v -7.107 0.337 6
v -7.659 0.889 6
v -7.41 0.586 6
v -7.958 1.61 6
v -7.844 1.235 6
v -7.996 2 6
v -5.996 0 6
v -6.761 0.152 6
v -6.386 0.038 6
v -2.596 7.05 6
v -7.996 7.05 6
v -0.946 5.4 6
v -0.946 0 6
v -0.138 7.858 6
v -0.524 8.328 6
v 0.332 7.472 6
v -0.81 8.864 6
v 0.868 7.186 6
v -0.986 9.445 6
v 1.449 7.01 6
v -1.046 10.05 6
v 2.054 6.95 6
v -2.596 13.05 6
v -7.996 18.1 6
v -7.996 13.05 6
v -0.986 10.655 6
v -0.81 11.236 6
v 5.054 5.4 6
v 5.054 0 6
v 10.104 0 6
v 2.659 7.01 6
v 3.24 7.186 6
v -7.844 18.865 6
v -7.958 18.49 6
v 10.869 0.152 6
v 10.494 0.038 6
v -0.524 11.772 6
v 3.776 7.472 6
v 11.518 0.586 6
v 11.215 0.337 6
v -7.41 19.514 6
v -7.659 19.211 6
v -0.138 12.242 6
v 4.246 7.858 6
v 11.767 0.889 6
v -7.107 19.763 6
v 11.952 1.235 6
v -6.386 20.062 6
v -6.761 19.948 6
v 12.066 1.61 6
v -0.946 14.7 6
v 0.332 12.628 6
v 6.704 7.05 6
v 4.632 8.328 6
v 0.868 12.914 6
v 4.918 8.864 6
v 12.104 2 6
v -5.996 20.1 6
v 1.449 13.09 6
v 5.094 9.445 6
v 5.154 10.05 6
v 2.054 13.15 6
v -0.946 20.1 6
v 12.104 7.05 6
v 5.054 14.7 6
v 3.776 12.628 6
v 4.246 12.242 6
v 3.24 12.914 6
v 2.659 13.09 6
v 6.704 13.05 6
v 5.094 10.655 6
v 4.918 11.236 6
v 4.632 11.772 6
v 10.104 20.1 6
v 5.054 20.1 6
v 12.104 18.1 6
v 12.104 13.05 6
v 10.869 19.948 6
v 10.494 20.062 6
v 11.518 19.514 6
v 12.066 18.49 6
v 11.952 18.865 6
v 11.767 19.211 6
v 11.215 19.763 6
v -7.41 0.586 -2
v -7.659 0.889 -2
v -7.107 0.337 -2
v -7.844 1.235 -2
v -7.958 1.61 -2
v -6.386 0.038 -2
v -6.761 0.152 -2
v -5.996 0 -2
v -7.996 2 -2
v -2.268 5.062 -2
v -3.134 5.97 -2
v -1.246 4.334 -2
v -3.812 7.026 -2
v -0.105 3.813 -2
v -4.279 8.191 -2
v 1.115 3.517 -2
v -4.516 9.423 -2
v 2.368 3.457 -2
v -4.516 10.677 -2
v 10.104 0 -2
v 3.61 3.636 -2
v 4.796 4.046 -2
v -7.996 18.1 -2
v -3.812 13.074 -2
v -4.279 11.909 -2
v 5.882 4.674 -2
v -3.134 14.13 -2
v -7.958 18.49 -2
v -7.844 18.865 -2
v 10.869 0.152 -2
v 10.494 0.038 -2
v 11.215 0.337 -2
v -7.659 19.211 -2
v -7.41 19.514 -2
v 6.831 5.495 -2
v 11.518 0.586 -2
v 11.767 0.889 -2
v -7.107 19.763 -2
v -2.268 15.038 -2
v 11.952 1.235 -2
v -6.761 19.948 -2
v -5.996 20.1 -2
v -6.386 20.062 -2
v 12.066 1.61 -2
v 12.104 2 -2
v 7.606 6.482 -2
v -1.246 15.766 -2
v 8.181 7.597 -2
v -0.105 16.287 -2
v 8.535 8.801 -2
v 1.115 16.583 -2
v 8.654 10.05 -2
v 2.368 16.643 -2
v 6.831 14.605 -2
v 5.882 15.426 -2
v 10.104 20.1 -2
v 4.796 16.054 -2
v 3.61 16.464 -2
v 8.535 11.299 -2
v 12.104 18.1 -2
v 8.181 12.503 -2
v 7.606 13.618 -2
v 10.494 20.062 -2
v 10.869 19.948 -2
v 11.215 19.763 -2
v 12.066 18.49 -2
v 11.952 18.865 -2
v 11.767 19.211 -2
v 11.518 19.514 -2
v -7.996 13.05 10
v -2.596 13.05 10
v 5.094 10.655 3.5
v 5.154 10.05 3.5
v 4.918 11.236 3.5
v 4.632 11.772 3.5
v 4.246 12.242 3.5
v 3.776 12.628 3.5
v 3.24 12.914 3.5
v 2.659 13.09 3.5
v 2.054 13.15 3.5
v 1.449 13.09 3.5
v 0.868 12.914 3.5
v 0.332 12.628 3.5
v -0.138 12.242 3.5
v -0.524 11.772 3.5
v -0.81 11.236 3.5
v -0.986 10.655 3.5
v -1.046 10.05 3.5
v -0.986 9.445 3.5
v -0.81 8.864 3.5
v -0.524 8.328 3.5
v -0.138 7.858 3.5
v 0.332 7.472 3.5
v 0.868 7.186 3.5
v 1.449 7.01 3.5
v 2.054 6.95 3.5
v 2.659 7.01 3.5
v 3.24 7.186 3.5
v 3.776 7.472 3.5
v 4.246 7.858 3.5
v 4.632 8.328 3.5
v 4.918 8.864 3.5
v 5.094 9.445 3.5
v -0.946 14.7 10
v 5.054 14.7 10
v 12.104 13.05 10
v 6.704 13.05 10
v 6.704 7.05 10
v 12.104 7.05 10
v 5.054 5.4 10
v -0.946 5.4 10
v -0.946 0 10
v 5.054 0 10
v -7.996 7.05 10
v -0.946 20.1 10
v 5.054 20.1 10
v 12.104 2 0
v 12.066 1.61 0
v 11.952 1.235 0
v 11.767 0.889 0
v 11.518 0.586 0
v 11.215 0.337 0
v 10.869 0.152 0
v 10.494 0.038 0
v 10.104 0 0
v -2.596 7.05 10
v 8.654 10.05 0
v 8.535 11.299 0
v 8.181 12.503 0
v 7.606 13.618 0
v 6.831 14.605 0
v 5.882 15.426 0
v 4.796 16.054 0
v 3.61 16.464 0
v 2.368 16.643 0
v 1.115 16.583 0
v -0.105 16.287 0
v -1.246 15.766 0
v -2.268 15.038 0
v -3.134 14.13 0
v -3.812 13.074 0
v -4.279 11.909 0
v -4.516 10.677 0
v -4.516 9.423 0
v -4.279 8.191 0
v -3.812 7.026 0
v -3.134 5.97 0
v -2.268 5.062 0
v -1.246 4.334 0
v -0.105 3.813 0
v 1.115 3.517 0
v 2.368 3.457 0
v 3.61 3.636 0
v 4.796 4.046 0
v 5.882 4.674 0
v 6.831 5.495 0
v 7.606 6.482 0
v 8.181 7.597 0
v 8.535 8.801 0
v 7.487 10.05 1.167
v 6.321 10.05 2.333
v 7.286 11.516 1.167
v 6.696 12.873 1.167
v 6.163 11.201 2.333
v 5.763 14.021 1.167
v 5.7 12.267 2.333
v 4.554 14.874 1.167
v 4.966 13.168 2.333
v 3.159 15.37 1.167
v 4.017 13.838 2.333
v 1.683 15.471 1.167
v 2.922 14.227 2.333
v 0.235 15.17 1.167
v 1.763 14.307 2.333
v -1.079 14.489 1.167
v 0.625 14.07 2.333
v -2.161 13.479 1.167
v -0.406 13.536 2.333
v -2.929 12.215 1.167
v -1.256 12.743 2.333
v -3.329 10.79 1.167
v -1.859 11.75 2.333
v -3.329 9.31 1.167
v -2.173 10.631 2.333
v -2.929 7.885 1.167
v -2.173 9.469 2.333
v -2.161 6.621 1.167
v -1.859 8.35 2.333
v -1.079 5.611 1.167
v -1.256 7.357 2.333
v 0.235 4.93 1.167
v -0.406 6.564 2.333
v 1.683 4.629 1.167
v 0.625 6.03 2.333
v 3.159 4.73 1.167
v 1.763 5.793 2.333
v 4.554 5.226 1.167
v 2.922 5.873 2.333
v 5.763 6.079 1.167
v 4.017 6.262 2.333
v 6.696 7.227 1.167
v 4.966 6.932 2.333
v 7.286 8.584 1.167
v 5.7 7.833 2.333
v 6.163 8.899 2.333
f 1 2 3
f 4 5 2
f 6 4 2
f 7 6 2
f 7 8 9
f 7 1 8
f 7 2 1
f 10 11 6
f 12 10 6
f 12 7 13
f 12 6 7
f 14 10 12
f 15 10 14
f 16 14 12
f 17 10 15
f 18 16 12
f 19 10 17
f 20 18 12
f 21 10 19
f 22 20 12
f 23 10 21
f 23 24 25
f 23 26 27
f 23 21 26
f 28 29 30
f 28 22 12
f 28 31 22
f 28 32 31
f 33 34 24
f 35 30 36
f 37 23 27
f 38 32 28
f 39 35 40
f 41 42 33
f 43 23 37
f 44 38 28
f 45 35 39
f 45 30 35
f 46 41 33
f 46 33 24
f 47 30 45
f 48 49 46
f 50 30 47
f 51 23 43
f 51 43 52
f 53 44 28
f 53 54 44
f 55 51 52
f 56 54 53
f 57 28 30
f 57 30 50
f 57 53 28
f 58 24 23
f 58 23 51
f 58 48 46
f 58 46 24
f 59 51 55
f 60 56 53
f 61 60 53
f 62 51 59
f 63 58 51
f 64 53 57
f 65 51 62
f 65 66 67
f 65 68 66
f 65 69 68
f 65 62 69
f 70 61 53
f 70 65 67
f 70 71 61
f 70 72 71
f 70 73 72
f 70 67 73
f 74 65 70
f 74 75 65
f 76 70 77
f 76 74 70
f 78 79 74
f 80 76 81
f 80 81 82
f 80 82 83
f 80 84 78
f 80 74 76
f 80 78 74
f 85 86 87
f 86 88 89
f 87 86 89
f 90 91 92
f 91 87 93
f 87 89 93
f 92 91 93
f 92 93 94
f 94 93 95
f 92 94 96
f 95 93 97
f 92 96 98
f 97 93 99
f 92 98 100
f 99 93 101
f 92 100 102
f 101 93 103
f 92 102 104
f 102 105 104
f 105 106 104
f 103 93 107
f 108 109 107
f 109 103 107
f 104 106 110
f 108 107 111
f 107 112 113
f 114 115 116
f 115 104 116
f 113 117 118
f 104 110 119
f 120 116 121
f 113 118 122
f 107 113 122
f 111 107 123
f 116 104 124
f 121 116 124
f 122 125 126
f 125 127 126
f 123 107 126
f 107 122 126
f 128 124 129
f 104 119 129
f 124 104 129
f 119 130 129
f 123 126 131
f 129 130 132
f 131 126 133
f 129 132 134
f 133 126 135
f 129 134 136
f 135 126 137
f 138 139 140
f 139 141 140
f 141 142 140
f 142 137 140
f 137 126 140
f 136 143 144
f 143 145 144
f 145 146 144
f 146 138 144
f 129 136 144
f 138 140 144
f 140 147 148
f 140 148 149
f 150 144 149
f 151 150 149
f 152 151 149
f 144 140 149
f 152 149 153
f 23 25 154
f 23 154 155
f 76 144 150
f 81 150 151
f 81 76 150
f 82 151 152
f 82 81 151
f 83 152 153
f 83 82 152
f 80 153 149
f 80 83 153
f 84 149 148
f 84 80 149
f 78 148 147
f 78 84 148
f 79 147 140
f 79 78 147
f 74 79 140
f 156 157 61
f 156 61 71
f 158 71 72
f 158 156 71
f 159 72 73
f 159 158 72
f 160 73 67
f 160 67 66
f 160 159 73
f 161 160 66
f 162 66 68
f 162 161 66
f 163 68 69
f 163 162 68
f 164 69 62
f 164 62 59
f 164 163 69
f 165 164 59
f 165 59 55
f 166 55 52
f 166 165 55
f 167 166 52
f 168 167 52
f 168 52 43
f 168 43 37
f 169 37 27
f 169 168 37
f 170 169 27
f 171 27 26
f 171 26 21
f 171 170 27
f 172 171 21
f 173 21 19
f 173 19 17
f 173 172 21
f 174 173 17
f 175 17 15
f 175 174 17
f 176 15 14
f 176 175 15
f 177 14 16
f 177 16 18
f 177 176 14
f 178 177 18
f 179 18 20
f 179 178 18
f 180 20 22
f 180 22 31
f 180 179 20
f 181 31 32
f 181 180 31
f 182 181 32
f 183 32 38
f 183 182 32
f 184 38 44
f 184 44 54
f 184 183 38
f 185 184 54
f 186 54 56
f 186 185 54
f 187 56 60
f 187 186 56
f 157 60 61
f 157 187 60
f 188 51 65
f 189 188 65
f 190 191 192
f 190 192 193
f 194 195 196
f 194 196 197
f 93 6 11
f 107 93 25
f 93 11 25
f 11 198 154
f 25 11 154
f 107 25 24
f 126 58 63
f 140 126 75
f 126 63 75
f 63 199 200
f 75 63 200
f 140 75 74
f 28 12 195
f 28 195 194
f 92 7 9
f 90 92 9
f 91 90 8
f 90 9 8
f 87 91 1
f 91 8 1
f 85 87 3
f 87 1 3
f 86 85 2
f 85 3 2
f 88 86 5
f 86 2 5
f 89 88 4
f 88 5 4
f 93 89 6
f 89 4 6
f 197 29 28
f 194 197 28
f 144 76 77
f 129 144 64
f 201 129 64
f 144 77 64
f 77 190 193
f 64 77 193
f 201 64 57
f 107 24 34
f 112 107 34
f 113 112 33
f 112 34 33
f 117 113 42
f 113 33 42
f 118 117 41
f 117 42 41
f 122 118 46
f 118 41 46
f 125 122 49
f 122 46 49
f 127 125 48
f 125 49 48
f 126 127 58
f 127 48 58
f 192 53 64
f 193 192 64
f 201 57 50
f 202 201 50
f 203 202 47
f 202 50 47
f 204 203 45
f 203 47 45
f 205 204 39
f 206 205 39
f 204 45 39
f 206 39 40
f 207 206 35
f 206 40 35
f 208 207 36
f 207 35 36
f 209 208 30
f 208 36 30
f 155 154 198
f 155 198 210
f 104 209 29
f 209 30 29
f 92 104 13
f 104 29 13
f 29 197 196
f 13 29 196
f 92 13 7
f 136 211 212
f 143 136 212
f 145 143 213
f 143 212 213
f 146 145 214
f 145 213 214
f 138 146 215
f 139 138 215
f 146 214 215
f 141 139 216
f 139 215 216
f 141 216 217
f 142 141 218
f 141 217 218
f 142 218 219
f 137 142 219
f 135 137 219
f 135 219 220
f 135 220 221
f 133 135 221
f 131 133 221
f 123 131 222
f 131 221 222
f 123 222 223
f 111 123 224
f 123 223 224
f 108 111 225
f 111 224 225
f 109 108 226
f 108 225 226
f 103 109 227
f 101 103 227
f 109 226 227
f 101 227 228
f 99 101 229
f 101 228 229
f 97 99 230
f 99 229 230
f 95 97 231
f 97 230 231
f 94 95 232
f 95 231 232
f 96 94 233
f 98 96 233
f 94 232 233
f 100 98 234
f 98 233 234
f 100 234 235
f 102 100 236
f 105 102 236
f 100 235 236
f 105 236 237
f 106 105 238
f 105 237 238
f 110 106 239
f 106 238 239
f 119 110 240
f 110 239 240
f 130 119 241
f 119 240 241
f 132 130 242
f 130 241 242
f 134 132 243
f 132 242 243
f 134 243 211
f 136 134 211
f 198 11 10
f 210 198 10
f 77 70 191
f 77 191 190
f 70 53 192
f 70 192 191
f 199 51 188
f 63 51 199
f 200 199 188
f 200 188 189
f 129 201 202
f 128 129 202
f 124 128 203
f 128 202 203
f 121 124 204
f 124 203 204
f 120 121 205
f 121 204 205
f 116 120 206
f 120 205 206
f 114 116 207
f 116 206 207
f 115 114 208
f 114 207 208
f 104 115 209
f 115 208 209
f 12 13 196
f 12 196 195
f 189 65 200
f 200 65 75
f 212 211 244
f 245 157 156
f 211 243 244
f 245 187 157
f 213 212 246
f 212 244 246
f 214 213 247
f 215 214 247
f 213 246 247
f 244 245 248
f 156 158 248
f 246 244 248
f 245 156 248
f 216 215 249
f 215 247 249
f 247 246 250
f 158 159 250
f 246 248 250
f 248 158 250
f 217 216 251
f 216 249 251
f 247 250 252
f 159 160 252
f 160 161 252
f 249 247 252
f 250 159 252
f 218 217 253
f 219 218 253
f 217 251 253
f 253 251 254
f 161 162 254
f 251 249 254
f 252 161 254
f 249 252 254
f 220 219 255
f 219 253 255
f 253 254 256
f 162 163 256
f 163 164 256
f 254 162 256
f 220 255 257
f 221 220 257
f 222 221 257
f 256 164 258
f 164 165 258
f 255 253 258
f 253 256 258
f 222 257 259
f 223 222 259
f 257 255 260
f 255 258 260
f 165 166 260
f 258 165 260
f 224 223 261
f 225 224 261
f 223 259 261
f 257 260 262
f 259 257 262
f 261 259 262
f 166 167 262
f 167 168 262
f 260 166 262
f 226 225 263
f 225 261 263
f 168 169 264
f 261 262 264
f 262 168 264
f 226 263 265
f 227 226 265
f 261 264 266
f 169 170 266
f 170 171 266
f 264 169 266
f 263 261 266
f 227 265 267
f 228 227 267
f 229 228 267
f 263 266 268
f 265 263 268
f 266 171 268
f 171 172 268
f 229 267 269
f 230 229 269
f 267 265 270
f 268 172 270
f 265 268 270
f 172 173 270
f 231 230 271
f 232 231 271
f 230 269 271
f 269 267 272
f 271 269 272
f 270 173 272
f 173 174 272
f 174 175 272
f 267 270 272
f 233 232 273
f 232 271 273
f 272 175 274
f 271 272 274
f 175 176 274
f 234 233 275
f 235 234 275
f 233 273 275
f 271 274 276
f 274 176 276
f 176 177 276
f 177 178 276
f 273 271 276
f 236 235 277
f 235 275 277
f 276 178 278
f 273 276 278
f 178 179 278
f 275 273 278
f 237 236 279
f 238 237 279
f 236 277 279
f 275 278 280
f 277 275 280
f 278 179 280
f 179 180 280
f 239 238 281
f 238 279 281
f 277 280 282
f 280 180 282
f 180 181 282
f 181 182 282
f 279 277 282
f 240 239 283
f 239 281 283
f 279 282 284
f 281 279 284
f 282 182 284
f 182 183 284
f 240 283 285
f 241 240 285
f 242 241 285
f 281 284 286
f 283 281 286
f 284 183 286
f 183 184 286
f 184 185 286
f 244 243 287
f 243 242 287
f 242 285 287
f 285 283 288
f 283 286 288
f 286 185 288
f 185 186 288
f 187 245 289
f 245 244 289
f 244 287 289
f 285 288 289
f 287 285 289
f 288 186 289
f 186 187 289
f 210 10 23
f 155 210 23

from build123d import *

# Parameters (mm, degrees)
F0_R     = 3.1
F0_W     = 5.4
F0_H     = 6
F0_W_2   = 6
F0_H_2   = 5.4
F1_DEPTH = 6
F2_DEPTH = 10
F3_R     = 2
F4_SIZE  = 3.5
F5_DEPTH = 2


# Not quite as in the source:
# - a feature names something its author has since deleted; it is built from what else it names


with BuildPart() as f1:
    # F0 (on Top) → F1 (new body)
    with BuildSketch(Plane.XY):
        Polygon((-7.9959459106, 7.05), (-7.9959459106, 0), (-0.9459459106, 0), (-0.9459459106, 5.4), (5.0540540894, 5.4), (5.0540540894, 0), (12.1040540894, 0), (12.1040540894, 7.05), (6.7040540894, 7.05), (6.7040540894, 13.05), (12.1040540894, 13.05), (12.1040540894, 20.1), (5.0540540894, 20.1), (5.0540540894, 14.7), (-0.9459459106, 14.7), (-0.9459459106, 20.1), (-7.9959459106, 20.1), (-7.9959459106, 13.05), (-2.5959459106, 13.05), (-2.5959459106, 7.05), align=None)
        with Locations((2.0540540894, 10.05)):
            Circle(F0_R, mode=Mode.SUBTRACT)
        with Locations((9.4040540894, 10.05)):
            Rectangle(F0_W, F0_H)
        with Locations((-5.2959459106, 10.05)):
            Rectangle(F0_W, F0_H)
        with Locations((2.0540540894, 17.4)):
            Rectangle(F0_W_2, F0_H_2)
        with Locations((2.0540540894, 2.7)):
            Rectangle(F0_W_2, F0_H_2)
    extrude(amount=F1_DEPTH)

    # F0 (on Top) → F2 (join)
    with BuildSketch(Plane.XY):
        with Locations((2.0540540894, 17.4)):
            Rectangle(F0_W_2, F0_H_2)
        with Locations((-5.2959459106, 10.05)):
            Rectangle(F0_W, F0_H)
        with Locations((2.0540540894, 2.7)):
            Rectangle(F0_W_2, F0_H_2)
        with Locations((9.4040540894, 10.05)):
            Rectangle(F0_W, F0_H)
    extrude(amount=F2_DEPTH)

    # F3
    f3_edges = [f1.edges().sort_by_distance(p)[0] for p in [
        (-7.995946, 0, 3),
        (12.104054, 0, 3),
        (12.104054, 20.1, 3),
        (-7.995946, 20.1, 3),
    ]]
    fillet(f3_edges, radius=F3_R)

    # F4
    f4_edges = [f1.edges().sort_by_distance(p)[0] for p in [
        (-1.045946, 10.05, 0),
    ]]
    chamfer(f4_edges, length=F4_SIZE)

    # F5 (add): a face of the model
    f5_faces = [f1.faces().sort_by_distance(p)[0] for p in [
        (-4.8302028367, 10.05, 0),
    ]]
    extrude(f5_faces, amount=F5_DEPTH)


solid = f1.part
